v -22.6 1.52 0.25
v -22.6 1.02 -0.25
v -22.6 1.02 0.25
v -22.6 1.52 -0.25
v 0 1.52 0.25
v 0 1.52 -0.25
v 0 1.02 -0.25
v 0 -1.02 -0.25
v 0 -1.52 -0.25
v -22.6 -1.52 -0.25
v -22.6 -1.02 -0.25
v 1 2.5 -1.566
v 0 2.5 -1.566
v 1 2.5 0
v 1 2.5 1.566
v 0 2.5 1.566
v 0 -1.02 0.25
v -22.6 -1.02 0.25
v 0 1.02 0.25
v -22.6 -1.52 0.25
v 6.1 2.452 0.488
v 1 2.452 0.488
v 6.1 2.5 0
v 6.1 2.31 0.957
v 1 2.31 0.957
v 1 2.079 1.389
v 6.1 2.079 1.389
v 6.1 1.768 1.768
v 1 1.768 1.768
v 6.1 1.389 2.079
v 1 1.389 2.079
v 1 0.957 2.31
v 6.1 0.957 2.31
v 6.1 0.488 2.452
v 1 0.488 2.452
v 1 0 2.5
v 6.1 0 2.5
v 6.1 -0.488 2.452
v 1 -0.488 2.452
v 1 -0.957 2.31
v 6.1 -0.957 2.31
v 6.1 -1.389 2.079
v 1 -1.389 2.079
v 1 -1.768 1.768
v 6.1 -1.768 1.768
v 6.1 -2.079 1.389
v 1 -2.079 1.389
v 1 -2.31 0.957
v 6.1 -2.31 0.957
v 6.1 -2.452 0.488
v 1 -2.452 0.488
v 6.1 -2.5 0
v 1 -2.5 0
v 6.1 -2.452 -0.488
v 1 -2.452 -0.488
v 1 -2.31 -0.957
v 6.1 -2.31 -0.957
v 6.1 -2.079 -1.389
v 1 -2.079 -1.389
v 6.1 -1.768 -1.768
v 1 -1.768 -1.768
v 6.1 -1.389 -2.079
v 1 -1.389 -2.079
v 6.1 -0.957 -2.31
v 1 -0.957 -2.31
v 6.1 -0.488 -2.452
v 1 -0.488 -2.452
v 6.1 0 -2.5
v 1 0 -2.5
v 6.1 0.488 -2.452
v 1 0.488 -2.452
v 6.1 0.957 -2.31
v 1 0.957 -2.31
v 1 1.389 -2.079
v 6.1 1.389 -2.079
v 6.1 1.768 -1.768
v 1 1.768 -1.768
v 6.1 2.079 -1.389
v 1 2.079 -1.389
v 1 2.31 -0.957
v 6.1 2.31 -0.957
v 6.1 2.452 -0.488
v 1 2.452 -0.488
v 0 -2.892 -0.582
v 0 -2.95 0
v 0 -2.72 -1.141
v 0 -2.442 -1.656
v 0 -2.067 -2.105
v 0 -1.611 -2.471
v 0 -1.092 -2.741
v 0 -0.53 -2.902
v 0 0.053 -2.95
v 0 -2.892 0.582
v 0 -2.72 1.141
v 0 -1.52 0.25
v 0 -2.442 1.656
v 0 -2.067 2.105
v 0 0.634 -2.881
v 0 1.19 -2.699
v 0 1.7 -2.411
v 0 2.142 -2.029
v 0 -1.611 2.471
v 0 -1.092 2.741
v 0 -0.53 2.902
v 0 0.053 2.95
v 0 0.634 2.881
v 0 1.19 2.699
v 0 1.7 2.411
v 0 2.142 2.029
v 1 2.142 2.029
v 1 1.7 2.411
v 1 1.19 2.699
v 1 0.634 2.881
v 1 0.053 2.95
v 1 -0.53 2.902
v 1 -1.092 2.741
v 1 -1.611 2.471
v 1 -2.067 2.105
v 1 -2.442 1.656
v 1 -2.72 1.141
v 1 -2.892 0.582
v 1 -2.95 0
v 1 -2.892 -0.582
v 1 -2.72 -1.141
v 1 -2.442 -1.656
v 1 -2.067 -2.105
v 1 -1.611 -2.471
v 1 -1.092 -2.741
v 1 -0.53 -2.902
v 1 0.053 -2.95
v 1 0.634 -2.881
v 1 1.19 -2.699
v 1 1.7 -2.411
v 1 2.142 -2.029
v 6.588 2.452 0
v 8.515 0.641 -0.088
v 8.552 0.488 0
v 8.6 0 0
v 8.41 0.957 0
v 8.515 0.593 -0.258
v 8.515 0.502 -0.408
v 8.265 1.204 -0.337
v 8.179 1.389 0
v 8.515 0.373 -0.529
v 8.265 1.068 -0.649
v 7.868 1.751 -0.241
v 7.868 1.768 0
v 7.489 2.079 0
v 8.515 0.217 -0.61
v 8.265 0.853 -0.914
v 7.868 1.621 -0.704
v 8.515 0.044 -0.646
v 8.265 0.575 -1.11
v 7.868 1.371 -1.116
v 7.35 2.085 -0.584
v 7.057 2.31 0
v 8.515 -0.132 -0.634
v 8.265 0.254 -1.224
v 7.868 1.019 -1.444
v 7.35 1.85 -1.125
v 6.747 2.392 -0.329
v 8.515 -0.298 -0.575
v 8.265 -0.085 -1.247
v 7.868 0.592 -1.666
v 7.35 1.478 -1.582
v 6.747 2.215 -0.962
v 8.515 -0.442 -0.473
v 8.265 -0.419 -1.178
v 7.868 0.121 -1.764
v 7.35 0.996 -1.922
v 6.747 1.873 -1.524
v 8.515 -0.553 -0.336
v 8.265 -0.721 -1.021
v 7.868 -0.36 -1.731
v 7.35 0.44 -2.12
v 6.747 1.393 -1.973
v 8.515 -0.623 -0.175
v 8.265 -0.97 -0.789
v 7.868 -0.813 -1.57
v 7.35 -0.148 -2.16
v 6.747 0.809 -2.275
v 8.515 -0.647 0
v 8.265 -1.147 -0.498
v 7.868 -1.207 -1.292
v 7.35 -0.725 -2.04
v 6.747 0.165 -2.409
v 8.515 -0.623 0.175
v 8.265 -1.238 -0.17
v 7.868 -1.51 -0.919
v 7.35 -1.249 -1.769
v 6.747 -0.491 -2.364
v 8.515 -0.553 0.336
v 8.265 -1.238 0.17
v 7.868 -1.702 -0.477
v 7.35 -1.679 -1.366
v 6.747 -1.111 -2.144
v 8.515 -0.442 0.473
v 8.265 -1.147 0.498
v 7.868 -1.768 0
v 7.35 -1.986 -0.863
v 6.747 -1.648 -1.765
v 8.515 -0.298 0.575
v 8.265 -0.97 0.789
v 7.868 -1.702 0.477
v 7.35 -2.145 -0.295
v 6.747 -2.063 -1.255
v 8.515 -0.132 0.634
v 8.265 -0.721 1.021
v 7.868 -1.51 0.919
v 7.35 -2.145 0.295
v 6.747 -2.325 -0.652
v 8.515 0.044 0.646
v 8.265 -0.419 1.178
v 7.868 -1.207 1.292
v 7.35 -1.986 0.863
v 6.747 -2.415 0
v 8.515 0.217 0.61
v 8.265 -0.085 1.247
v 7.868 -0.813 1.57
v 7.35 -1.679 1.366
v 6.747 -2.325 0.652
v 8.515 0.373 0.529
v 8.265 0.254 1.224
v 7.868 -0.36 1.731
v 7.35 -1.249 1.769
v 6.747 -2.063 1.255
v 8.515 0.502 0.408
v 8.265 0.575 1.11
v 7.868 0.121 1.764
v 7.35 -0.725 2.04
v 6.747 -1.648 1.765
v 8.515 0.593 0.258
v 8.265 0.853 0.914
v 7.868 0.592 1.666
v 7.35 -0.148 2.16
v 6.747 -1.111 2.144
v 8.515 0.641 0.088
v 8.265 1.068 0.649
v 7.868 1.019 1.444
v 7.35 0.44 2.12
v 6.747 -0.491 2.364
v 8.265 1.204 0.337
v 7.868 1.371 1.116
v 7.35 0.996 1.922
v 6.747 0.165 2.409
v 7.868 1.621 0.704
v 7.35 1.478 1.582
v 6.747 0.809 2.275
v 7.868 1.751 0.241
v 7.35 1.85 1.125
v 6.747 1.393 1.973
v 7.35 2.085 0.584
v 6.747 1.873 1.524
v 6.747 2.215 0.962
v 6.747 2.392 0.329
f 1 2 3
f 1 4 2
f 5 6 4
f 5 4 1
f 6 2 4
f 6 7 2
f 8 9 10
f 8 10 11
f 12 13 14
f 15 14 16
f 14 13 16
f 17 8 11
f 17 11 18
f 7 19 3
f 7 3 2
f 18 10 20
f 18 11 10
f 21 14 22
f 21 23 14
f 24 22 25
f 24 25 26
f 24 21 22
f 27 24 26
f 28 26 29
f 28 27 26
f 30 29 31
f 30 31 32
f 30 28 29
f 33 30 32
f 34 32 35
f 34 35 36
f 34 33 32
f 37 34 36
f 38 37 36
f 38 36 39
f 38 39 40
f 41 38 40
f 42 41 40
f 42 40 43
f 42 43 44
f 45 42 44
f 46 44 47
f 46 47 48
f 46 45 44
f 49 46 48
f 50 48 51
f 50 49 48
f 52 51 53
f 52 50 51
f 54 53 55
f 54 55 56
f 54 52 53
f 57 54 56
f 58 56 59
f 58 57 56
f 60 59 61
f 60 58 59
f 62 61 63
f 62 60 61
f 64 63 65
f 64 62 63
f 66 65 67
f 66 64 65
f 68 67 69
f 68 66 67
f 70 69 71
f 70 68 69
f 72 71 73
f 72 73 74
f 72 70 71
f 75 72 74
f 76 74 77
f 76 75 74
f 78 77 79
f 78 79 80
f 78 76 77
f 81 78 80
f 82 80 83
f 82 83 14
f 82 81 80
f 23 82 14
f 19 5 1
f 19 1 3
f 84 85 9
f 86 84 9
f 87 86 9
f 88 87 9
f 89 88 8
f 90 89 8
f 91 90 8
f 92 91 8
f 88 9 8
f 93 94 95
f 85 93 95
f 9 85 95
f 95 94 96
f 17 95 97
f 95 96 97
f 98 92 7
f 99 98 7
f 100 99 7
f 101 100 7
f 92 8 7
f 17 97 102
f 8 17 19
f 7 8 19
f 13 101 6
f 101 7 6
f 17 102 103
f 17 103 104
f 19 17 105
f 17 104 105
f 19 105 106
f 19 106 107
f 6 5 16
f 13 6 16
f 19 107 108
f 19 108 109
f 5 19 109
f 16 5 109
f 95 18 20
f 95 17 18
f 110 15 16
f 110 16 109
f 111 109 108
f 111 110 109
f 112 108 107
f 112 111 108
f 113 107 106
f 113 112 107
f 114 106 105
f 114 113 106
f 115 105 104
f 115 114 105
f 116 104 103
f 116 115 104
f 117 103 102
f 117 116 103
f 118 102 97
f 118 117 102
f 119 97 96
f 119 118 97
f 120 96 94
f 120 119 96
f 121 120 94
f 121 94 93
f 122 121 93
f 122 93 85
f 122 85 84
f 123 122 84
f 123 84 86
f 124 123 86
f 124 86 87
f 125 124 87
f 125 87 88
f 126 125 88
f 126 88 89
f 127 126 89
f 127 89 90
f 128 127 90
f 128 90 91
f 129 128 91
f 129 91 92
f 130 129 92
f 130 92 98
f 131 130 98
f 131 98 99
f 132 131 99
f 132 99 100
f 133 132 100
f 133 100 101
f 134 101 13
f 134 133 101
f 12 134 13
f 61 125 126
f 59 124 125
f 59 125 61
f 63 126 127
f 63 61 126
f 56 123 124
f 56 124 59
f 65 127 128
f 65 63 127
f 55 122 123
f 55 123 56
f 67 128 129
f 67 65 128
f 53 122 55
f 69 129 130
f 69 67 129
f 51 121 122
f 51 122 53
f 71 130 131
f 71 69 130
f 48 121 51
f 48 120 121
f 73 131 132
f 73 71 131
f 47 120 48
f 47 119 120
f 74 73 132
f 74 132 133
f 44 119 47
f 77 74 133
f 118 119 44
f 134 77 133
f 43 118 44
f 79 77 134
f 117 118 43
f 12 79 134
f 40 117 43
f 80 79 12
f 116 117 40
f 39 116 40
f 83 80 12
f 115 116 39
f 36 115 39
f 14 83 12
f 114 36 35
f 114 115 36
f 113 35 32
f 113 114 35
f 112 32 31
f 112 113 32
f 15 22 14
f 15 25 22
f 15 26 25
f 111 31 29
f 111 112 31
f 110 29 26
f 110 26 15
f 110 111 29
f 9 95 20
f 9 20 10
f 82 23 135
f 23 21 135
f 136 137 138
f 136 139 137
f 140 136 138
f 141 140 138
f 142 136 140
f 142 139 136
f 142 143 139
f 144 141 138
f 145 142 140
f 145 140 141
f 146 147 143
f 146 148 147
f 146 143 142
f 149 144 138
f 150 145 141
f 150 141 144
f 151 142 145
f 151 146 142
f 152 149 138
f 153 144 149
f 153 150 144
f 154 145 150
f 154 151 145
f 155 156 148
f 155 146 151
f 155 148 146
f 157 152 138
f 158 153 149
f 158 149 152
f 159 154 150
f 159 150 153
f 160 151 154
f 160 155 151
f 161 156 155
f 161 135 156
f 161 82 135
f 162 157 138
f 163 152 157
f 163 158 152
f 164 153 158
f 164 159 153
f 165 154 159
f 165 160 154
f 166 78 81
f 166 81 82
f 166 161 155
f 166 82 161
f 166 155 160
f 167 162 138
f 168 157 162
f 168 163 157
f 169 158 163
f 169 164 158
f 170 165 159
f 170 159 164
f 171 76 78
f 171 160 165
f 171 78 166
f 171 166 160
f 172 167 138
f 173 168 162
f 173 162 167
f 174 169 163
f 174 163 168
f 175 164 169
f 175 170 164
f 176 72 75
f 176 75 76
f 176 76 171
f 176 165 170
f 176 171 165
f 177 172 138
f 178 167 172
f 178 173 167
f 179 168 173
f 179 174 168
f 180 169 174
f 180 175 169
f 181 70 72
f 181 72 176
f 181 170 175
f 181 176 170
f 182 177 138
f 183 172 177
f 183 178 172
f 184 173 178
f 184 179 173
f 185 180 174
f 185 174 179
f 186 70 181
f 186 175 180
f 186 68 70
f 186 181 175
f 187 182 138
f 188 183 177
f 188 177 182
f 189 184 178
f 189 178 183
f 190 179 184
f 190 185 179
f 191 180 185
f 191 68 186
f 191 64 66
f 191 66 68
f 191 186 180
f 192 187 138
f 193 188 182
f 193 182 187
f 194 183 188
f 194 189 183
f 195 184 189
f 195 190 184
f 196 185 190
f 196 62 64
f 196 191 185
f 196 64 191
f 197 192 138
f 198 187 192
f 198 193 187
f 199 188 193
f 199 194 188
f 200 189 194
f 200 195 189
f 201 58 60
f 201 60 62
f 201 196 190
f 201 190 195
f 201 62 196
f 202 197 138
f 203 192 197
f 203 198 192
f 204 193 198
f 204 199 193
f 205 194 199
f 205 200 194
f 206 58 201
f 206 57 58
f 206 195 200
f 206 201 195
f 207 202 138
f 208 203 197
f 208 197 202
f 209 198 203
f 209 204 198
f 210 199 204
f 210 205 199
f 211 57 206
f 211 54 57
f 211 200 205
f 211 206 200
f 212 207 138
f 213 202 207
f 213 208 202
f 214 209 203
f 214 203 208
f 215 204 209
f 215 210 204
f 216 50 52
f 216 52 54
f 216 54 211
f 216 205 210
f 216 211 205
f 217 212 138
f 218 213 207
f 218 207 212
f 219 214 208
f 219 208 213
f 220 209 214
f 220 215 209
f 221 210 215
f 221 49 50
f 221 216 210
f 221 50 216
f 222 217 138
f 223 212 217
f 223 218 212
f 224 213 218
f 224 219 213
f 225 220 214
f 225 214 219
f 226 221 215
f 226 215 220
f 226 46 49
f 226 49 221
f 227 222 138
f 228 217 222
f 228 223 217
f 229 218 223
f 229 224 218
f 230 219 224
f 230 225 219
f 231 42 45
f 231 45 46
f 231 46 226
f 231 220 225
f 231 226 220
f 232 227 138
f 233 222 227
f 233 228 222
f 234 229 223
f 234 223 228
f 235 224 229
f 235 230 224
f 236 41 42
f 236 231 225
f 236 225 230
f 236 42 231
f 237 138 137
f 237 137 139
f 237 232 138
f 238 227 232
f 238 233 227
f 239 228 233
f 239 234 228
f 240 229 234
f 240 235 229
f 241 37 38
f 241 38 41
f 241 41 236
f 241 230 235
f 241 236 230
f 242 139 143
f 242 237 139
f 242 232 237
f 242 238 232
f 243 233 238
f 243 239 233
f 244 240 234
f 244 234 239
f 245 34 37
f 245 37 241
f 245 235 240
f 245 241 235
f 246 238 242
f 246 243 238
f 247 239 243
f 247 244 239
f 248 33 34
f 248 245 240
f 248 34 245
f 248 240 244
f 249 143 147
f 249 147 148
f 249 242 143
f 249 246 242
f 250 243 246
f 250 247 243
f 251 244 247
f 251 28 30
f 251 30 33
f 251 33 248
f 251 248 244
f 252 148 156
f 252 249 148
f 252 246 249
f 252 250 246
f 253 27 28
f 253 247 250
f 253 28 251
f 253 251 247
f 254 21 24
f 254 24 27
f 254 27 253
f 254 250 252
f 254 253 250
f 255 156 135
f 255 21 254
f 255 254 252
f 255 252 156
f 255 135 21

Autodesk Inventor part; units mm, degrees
ref_plane "YZ Plane" through (0, 0, 0) normal (1, 0, 0) x (0, 1, 0)
ref_plane "XZ Plane" through (0, 0, 0) normal (0, 1, 0) x (-1, 0, 0)
ref_plane "XY Plane" through (0, 0, 0) normal (0, 0, 1) x (1, 0, 0)
sketch "Sketch1" plane through (0, 0, 0) normal (0, 0, 1) x (1, 0, 0)
  line L0 (-33.5517, 0) -> (33.5517, 0)
  line L1 (0, 0) -> (0, 2.95)
  line L2 (0, 2.95) -> (1, 2.95)
  line L3 (1, 2.95) -> (1, 2.5)
  line L4 (1, 2.5) -> (6.1, 2.5)
  arc A0 (8.6, 0) -> (6.1, 2.5) centre (6.1, 0) ccw
  line L5 (8.6, 0) -> (0, 0)
  dimension "d1" = 2.95
  dimension "d2" = 1
  dimension "d3" = 5
  dimension "d4" = 8.6
  dimension "d5" = 2.5
revolve "Revolution1" add sketch "Sketch1" angle 360 about axis through (-33.5517, 0, 0) along (1, 0, 0)
sketch "Sketch2" plane through (0, 0, 0) normal (-1, 0, 0) x (0, 0, 1)
  circle A0 centre (0, 0) radius 2.95 projected
  line L0 (-0.25, 1.52) -> (0.25, 1.52)
  line L1 (0.25, 1.52) -> (0.25, 1.02)
  line L2 (0.25, 1.02) -> (-0.25, 1.02)
  line L3 (-0.25, 1.02) -> (-0.25, 1.52)
  line L4 (-0.25, -1.02) -> (0.25, -1.02)
  line L5 (0.25, -1.02) -> (0.25, -1.52)
  line L6 (0.25, -1.52) -> (-0.25, -1.52)
  line L7 (-0.25, -1.52) -> (-0.25, -1.02)
  line L8 (-0.25, 1.27) -> (0.25, 1.27) construction
  line L9 (-0.25, -1.27) -> (0.25, -1.27) construction
  point P0 (0, 1.52)
  point P1 (0, -1.02)
  dimension "d7" = 0.5
  dimension "d8" = 0.5
  dimension "d9" = 1.27
  dimension "d10" = 1.27
extrude "Extrusion1" add sketch "Sketch2" along normal blind 22.6 contours L0 L1 L2 L3 | L4 L5 L6 L7
sketch "Sketch4" plane through (0, 0, 0) normal (-1, 0, 0) x (0, 0, 1)
  line L0 (-0.25, 1.52) -> (0.25, 1.52) projected
  circle A0 centre (0, 0) radius 2.95 projected
  circle A1 centre (0, 0) radius 2.5 projected
  line L1 (-1.566, 2.5) -> (1.566, 2.5)
  point P0 (0, 2.5)
extrude "Extrusion2" cut sketch "Sketch4" against normal through all contours L1 A0 picked at (-0.846, 2.5951)
sketch "Sketch3" plane through (-22.6, 0, 0) normal (-1, 0, 0) x (0, 0, 1)
  line L0 (0.25, 1.52) -> (0.25, 1.02) projected
  line L1 (-0.25, 1.52) -> (0.25, 1.52) projected
  line L2 (-0.25, 1.02) -> (-0.25, 1.52) projected
  line L3 (0.25, 1.02) -> (-0.25, 1.02) projected
  line L4 (0.25, -1.02) -> (0.25, -1.52) projected
  line L5 (-0.25, -1.02) -> (0.25, -1.02) projected
  line L6 (-0.25, -1.52) -> (-0.25, -1.02) projected
  line L7 (0.25, -1.52) -> (-0.25, -1.52) projected
  point P0 (0, 0)
  point P1 (0, 1.27)
  point P2 (0, -1.27)
  point P3 (-0.25, 1.27)
  point P4 (-0.25, -1.27)
equation "\"d10\" = d9"
equation "\"Lead_solder\" = 1"
properties part number "LED 5mm Red height 1-20mm"
